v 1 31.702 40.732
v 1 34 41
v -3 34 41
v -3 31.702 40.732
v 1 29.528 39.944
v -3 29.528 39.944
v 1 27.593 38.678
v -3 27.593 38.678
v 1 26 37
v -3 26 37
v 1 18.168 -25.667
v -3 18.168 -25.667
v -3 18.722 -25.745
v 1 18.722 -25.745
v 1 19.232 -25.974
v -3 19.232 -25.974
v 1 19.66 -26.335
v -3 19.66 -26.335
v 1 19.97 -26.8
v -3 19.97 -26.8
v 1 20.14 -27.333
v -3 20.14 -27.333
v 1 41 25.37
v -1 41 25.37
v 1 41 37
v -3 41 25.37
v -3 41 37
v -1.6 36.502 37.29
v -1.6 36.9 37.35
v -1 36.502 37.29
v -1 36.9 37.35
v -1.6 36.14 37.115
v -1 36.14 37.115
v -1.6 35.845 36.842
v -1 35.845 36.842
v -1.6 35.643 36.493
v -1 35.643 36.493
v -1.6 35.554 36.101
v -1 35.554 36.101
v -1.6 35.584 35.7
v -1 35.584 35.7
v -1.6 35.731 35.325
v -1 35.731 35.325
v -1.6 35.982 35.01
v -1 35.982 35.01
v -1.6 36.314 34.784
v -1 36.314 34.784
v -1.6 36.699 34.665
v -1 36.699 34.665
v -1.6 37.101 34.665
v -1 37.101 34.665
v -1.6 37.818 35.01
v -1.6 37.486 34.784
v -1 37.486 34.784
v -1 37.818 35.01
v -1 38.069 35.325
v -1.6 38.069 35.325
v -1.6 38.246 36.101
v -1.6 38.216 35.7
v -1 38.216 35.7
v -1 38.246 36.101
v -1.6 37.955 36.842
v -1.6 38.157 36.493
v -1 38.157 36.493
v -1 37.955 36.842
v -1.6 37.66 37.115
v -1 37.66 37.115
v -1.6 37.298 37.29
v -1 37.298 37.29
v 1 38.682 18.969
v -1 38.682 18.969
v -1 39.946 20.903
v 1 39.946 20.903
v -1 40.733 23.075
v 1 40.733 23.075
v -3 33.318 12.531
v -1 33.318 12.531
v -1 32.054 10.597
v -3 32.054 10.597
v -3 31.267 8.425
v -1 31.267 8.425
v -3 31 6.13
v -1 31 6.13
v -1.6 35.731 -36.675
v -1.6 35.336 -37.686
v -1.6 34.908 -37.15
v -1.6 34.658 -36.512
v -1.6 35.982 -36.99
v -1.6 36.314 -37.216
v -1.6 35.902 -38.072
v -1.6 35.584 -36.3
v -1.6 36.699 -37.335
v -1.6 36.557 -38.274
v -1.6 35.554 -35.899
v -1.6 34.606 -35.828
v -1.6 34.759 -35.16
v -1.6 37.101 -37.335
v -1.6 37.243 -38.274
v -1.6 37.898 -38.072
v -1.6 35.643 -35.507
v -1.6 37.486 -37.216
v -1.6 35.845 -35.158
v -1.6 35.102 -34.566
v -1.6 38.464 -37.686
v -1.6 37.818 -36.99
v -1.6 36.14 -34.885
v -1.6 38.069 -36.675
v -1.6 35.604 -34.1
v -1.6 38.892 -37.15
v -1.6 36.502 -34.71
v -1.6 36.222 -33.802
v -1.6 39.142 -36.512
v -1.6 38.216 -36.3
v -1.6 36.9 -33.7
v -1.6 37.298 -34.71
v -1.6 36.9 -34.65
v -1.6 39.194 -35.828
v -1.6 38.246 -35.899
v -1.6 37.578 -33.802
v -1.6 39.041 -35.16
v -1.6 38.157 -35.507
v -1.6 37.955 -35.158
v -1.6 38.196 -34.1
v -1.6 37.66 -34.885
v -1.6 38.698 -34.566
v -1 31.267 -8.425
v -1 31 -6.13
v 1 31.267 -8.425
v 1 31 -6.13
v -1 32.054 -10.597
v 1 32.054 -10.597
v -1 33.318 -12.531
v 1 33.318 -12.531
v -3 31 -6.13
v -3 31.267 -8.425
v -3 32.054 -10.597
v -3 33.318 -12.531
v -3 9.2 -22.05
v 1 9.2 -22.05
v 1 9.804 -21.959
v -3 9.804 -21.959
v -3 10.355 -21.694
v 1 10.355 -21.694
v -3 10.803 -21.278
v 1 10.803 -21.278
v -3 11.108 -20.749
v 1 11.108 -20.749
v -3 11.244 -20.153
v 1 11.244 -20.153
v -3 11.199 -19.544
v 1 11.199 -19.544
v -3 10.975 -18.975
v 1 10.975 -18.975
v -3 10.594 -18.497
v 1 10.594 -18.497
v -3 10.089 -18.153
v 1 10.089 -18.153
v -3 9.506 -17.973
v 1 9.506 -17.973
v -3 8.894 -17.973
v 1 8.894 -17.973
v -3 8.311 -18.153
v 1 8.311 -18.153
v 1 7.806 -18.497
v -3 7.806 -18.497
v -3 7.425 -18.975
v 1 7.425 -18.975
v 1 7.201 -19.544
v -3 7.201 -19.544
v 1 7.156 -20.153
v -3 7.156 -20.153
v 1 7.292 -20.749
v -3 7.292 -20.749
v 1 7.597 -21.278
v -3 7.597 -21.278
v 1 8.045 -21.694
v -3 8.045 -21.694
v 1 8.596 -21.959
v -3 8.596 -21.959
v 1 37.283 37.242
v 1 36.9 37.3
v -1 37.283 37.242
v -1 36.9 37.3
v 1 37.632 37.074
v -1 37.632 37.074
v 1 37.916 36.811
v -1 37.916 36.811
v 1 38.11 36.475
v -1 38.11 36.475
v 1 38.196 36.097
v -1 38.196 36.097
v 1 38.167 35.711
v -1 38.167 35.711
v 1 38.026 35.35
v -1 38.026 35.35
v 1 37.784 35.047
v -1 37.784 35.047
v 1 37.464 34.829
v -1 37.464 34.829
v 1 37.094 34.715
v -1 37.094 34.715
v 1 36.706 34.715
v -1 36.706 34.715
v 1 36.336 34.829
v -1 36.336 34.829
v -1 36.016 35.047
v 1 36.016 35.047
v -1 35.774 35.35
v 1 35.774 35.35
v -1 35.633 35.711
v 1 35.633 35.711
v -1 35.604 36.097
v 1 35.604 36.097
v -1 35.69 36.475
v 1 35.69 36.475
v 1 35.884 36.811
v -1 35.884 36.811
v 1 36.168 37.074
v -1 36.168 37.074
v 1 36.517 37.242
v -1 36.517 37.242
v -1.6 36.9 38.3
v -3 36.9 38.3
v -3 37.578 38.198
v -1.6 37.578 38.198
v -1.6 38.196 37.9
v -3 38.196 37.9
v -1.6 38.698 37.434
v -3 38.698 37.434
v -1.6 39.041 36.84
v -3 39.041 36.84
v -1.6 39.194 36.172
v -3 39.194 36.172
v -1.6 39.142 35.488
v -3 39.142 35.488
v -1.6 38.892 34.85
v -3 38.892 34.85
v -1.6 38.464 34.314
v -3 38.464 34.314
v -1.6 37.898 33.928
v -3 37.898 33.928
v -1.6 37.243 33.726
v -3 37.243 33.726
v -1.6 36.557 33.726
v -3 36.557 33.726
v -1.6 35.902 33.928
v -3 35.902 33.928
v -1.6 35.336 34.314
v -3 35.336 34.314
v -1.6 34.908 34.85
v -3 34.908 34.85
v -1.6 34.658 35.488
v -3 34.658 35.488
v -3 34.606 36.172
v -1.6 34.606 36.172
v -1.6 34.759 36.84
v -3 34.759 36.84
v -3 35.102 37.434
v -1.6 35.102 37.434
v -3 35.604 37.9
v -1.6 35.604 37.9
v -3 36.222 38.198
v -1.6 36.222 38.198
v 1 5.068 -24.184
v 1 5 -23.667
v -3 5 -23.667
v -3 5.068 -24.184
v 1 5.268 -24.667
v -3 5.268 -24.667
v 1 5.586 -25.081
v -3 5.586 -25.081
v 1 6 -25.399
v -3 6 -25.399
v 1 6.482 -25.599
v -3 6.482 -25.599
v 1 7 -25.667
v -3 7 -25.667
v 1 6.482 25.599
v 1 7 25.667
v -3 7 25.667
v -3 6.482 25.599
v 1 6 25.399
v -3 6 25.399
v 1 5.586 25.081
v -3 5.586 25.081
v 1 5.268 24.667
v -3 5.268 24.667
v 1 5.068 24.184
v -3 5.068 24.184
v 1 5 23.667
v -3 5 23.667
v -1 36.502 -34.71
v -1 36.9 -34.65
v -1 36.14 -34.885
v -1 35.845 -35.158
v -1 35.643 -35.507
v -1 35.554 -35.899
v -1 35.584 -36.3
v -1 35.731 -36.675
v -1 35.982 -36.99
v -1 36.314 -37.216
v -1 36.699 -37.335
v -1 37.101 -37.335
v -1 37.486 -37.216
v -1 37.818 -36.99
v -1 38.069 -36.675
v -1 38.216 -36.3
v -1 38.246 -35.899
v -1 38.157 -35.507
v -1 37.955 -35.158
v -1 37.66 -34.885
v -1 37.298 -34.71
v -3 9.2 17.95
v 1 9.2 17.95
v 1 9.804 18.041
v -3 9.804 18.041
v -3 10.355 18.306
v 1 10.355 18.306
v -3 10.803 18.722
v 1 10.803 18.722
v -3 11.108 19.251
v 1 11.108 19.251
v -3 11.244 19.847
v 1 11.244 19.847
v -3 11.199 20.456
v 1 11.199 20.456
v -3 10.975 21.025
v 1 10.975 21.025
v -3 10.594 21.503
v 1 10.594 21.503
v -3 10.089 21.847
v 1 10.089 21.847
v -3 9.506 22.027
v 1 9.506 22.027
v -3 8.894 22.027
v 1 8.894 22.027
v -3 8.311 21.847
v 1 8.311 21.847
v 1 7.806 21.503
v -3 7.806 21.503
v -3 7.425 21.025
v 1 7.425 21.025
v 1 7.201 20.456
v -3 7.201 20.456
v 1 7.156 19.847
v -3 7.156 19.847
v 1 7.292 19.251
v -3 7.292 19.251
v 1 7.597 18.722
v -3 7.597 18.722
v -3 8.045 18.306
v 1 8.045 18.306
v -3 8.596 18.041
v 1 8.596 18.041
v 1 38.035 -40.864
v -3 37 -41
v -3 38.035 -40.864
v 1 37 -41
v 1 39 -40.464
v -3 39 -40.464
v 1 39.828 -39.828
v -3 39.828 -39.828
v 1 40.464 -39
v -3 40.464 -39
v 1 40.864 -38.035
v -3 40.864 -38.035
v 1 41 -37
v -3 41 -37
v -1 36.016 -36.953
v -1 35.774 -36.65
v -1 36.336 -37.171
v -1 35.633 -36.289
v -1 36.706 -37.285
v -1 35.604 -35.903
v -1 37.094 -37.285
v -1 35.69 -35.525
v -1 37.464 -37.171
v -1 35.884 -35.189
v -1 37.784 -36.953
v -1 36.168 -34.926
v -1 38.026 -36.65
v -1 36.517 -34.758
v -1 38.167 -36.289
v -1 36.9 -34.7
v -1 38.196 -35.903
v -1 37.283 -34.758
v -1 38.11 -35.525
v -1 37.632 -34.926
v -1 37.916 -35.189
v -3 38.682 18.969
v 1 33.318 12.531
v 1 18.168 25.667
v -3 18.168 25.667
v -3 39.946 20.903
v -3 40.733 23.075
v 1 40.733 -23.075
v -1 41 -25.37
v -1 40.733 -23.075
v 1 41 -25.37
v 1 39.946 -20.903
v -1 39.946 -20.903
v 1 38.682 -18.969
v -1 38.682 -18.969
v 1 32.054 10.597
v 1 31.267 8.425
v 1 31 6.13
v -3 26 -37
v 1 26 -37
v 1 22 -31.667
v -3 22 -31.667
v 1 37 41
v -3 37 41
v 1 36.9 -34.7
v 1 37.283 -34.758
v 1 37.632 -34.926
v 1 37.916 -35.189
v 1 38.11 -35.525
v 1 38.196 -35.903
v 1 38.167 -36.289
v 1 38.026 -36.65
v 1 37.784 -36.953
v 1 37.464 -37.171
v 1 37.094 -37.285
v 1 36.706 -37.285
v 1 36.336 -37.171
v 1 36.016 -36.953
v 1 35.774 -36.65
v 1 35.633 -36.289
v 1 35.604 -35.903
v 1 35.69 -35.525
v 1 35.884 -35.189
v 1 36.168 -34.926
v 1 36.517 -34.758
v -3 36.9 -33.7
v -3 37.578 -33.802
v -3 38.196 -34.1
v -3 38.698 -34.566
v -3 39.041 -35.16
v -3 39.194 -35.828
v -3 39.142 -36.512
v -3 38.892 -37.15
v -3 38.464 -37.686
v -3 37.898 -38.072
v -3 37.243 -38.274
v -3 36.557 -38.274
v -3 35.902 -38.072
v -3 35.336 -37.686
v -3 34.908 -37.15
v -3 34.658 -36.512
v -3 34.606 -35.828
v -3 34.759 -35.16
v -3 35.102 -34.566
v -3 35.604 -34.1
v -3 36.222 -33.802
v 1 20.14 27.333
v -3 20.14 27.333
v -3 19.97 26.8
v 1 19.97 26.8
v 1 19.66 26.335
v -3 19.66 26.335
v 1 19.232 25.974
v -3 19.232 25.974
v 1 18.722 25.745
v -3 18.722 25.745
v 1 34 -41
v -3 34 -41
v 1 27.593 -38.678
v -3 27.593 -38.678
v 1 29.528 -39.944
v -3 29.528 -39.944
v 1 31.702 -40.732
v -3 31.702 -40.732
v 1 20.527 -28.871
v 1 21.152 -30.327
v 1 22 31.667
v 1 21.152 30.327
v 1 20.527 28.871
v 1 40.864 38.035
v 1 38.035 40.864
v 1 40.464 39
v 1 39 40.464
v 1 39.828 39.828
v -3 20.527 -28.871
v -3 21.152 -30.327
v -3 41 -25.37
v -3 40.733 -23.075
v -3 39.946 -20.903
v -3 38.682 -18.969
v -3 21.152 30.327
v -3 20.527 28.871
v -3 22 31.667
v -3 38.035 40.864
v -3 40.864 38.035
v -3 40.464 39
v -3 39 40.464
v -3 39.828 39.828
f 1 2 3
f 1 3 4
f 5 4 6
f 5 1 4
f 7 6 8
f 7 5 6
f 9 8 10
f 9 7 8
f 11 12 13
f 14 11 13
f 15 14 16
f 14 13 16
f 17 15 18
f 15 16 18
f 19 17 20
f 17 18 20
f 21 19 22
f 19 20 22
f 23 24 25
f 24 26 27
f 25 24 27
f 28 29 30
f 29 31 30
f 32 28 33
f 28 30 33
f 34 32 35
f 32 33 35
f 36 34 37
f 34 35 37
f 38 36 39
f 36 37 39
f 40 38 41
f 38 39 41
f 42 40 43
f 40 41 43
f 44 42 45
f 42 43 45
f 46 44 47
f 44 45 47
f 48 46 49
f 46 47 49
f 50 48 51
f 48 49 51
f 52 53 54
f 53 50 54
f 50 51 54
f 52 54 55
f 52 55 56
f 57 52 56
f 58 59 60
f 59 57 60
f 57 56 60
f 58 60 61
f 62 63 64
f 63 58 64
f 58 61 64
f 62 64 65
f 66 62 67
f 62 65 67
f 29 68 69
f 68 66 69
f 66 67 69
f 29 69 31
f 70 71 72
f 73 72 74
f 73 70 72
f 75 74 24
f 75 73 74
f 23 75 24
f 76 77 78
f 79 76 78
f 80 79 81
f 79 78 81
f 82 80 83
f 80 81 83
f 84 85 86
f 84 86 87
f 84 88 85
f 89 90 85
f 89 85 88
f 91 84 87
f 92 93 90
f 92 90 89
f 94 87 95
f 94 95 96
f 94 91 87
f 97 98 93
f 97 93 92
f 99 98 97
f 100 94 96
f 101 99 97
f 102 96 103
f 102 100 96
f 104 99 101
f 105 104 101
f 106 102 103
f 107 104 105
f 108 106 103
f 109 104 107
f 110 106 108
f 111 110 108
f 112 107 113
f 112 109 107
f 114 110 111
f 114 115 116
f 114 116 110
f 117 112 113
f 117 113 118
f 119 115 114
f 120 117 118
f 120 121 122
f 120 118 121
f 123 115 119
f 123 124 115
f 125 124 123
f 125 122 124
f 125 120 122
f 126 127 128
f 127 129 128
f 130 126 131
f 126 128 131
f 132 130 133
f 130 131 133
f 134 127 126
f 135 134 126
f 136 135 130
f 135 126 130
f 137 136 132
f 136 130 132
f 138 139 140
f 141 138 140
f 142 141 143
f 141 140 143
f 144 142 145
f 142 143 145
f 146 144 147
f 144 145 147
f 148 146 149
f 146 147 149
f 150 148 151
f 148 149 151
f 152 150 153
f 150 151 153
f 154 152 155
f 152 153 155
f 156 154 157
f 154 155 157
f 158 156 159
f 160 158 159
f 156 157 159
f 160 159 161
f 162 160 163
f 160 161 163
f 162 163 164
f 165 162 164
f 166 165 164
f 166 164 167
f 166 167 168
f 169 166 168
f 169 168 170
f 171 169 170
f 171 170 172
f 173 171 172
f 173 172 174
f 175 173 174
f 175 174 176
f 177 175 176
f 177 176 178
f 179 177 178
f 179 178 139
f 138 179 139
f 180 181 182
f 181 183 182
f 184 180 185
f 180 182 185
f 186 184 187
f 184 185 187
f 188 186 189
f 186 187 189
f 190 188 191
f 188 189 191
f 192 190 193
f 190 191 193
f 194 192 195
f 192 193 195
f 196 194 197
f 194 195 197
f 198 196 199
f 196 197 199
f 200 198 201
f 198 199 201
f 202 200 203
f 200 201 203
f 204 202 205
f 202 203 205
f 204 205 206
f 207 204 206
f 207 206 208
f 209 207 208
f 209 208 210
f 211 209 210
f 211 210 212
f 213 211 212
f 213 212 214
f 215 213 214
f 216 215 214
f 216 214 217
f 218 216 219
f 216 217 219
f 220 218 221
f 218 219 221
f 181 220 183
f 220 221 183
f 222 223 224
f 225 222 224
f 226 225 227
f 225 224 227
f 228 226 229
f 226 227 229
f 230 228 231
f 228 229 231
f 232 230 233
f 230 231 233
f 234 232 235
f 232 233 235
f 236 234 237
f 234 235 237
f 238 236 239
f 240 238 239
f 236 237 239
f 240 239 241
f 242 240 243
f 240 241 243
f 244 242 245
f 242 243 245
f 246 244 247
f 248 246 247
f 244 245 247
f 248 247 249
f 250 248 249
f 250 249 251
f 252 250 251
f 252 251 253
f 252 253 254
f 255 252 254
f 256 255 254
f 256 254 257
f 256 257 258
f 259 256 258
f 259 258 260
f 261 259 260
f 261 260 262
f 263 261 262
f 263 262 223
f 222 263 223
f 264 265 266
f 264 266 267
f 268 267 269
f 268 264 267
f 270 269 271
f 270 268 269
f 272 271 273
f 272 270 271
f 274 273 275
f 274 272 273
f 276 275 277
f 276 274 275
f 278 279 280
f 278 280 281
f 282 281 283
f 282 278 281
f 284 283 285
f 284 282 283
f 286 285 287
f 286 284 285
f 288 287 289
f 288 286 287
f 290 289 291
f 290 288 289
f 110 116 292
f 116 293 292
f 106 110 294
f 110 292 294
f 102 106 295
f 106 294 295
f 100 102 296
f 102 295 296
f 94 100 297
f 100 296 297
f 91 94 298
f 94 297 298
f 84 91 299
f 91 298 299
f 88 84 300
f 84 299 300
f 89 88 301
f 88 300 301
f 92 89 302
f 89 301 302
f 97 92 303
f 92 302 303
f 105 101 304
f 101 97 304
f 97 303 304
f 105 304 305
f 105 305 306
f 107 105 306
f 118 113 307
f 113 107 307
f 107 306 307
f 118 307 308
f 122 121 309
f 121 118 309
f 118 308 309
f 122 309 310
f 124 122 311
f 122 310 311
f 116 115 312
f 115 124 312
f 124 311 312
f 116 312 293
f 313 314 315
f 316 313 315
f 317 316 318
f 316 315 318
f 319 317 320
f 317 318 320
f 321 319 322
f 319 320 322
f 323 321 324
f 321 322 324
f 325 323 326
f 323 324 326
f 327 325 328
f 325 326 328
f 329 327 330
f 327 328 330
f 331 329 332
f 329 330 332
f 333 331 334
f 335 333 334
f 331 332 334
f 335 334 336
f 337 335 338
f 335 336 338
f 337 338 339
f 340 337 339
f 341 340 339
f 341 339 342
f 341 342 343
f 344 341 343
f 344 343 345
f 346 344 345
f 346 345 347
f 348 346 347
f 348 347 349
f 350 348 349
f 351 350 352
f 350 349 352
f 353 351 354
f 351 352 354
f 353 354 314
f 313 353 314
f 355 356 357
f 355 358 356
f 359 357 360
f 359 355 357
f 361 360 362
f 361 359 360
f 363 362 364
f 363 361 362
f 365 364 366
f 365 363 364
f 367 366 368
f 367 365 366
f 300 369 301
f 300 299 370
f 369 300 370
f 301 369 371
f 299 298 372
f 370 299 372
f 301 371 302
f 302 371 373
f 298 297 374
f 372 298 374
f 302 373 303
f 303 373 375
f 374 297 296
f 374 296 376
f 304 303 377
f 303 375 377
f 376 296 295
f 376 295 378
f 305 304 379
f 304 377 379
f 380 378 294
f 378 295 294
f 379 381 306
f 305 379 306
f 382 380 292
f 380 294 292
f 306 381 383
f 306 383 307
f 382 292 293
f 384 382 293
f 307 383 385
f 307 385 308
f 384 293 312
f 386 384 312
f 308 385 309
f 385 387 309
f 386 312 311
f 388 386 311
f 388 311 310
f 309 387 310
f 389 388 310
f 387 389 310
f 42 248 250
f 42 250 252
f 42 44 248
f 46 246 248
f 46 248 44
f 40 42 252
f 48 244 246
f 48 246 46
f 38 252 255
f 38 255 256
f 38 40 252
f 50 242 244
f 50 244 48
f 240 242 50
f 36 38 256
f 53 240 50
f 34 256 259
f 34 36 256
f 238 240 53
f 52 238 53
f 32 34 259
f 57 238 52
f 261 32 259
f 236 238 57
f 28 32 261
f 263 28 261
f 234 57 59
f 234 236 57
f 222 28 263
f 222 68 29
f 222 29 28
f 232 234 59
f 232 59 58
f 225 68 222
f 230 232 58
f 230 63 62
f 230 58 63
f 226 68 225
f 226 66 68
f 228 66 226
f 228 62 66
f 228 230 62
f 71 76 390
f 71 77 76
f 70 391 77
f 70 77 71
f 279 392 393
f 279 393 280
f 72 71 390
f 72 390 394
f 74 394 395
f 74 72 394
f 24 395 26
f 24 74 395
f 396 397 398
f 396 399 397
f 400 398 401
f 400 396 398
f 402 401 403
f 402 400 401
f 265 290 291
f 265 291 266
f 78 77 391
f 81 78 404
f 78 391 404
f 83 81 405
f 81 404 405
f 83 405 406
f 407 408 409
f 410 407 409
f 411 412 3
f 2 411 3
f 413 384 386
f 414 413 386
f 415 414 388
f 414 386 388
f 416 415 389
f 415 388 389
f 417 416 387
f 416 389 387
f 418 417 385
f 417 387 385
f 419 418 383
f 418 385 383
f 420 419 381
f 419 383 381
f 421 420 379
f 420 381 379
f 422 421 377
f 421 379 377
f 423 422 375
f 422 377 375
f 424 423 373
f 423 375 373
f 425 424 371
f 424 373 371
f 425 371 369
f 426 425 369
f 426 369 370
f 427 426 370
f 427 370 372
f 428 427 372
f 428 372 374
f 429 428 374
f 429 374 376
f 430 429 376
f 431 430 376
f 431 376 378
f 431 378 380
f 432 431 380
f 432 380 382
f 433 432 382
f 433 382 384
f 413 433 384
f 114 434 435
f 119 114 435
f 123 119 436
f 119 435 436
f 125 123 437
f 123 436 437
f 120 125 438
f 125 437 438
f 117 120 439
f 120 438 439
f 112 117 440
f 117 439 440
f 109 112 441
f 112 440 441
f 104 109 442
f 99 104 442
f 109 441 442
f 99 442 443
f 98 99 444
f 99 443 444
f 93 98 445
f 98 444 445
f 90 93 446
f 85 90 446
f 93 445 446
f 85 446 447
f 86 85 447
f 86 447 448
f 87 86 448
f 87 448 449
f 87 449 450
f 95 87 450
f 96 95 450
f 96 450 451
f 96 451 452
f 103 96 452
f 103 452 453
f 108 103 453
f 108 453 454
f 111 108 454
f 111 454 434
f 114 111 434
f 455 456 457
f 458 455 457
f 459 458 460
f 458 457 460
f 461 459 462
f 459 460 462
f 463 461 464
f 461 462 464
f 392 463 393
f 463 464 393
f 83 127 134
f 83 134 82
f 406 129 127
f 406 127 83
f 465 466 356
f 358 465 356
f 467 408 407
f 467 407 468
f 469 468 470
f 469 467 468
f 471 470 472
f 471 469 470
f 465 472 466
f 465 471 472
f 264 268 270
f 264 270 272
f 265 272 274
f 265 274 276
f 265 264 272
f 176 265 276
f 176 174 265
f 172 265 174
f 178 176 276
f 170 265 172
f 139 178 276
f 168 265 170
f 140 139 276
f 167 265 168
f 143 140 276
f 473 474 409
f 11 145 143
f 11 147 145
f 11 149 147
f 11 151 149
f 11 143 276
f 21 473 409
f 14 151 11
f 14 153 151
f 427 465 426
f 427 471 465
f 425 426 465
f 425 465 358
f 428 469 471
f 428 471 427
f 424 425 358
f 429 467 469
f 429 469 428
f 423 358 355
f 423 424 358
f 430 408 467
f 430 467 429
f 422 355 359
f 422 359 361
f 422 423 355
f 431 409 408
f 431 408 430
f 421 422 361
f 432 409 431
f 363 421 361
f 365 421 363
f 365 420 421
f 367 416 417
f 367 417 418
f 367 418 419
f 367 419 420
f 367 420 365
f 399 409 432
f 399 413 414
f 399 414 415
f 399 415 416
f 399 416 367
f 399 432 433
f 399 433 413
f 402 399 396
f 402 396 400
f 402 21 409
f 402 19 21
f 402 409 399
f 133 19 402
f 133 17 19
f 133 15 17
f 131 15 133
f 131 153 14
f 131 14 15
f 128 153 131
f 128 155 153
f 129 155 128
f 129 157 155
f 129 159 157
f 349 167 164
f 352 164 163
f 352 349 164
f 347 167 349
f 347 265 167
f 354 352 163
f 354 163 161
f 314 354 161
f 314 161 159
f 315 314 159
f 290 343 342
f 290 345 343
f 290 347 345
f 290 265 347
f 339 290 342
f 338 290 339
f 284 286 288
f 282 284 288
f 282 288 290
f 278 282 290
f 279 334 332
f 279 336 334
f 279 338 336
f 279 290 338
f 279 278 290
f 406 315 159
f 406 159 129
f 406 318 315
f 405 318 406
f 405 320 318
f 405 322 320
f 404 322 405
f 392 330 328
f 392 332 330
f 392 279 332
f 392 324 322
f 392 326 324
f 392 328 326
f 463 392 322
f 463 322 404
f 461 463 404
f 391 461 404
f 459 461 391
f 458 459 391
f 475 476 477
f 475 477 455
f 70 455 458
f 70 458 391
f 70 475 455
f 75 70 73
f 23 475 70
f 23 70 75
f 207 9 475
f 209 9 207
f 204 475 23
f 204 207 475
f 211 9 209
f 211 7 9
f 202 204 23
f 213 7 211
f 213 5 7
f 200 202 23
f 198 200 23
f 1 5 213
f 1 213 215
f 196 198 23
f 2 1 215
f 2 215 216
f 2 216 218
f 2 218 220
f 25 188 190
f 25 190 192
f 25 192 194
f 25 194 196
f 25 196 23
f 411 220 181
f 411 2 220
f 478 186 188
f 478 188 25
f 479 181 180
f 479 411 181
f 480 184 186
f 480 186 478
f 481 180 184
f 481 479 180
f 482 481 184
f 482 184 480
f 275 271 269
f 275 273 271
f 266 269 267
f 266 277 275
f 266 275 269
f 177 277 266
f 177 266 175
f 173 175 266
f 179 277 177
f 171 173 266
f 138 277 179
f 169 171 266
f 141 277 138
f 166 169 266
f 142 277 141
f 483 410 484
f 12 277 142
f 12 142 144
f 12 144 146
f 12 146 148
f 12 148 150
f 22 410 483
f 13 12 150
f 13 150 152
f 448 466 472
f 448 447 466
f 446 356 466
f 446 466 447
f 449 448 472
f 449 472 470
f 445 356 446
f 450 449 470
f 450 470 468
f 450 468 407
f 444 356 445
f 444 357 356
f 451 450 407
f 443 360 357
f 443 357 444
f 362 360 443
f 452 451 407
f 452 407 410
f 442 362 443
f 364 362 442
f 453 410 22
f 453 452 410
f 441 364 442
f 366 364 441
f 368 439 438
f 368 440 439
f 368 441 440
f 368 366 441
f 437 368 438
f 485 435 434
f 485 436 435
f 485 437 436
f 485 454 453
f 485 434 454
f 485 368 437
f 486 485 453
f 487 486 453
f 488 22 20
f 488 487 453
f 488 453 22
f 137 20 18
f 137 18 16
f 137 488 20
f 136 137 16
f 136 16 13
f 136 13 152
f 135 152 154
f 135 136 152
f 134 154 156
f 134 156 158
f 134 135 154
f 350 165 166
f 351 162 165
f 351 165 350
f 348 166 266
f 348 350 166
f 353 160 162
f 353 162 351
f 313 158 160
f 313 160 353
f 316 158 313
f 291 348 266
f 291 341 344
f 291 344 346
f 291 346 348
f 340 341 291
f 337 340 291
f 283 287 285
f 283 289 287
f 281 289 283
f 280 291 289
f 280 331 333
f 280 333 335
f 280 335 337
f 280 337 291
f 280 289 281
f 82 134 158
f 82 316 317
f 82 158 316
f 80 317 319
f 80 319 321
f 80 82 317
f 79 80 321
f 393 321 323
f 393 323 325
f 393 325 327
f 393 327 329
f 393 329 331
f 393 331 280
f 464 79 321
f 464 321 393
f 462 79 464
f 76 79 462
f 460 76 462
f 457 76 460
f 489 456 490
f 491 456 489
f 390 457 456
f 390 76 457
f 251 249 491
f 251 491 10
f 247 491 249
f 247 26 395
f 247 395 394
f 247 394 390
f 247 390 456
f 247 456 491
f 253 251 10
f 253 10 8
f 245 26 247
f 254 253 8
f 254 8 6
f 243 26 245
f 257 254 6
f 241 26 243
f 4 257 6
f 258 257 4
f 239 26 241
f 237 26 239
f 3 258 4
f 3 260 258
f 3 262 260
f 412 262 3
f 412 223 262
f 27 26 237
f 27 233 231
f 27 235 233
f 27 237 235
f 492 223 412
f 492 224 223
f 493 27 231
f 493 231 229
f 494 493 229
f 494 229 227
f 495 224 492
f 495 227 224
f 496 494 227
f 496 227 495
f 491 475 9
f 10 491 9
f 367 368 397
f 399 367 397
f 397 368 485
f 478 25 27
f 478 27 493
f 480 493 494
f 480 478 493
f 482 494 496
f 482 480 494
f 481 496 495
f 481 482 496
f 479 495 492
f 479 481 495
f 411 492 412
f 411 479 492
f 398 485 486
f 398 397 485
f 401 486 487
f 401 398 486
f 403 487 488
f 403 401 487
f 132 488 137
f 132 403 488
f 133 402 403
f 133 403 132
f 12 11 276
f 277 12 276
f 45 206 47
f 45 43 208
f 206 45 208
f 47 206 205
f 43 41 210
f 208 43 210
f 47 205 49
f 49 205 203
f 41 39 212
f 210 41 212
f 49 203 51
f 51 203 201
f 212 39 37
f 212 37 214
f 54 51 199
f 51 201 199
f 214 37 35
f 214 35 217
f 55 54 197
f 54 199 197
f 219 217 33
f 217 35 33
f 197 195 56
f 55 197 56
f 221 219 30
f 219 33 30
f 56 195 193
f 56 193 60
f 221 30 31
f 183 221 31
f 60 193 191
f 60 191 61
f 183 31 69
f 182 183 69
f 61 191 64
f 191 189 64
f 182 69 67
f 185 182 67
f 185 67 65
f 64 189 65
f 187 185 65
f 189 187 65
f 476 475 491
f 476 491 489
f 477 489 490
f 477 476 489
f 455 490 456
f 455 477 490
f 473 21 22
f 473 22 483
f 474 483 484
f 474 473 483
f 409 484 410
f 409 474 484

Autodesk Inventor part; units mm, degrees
ref_plane "YZ Plane" through (0, 0, 0) normal (1, 0, 0) x (0, 1, 0)
ref_plane "XZ Plane" through (0, 0, 0) normal (0, 1, 0) x (-1, 0, 0)
ref_plane "XY Plane" through (0, 0, 0) normal (0, 0, 1) x (1, 0, 0)
sketch "Sketch1" plane through (0, 0, 0) normal (1, 0, 0) x (0, 1, 0)
  line L0 (41, 41) -> (-41, 41)
  line L1 (-41, 41) -> (-41, -41)
  line L2 (-41, -41) -> (41, -41)
  line L3 (41, -41) -> (41, 41)
  point P0 (0, 0)
  point P1 (0, 41)
  point P2 (41, 0)
  dimension "d0" = 82
  dimension "d1" = 82
extrude "Extrusion1" add sketch "Sketch1" along normal mid plane 2
sketch "Sketch2" plane through (-1, 0, 0) normal (-1, 0, 0) x (0, 0, 1)
  line L0 (31.6667, 22) -> (37, 26) projected
  arc A0 (25.6667, 20) -> (31.6667, 22) centre (25.6667, 30) ccw projected
  line L1 (17.5, 20) -> (25.6667, 20) projected
  line L2 (17.5, 20) -> (17.5, 18.2355) projected
  line L3 (-17.5, 18.2356) -> (17.5, 18.2356) projected
  line L4 (-17.5, 20) -> (-17.5, 18.2355) projected
  line L5 (-25.6667, 20) -> (-17.5, 20) projected
  arc A1 (-31.6667, 22) -> (-25.6667, 20) centre (-25.6667, 30) ccw projected
  line L6 (-37, 26) -> (-31.6667, 22) projected
  arc A2 (-41, 34) -> (-37, 26) centre (-31, 34) ccw projected
  line L7 (-41, 37) -> (-41, 34) projected
  arc A3 (-37, 41) -> (-41, 37) centre (-37, 37) ccw projected
  line L8 (-37, 41) -> (-25.3705, 41) projected
  arc A4 (-18.9687, 38.6822) -> (-25.3705, 41) centre (-25.3705, 31) ccw projected
  line L9 (-18.9687, 38.6822) -> (-12.5313, 33.3178) projected
  arc A5 (-12.5313, 33.3178) -> (-6.1295, 31) centre (-6.1295, 41) ccw projected
  line L10 (-6.1295, 31) -> (6.1295, 31) projected
  arc A6 (6.1295, 31) -> (12.5313, 33.3178) centre (6.1295, 41) ccw projected
  line L11 (12.5313, 33.3178) -> (18.9687, 38.6822) projected
  arc A7 (25.3705, 41) -> (18.9687, 38.6822) centre (25.3705, 31) ccw projected
  line L12 (25.3705, 41) -> (37, 41) projected
  arc A8 (41, 37) -> (37, 41) centre (37, 37) ccw projected
  line L13 (41, 37) -> (41, 34) projected
  arc A9 (37, 26) -> (41, 34) centre (31, 34) ccw projected
  circle A10 centre (36, 36.9) radius 1.35 projected
  circle A11 centre (-36, 36.9) radius 1.35 projected
  line L14 (-25.6667, 20) -> (-25.6667, 5)
  line L15 (25.6667, 20) -> (25.6667, 5)
  line L16 (25.6667, 5) -> (-25.6667, 5)
  point P0 (0, 0)
  dimension "d4" = 15
extrude "Extrusion2" add sketch "Sketch2" along normal blind 2
sketch "Sketch3" plane through (1, 0, 0) normal (1, 0, 0) x (0, 0, -1)
  line L0 (-31.6667, 22) -> (-37, 26) projected
  arc A0 (-41, 34) -> (-37, 26) centre (-31, 34) ccw projected
  line L1 (-41, 34) -> (-41, 37) projected
  arc A1 (-37, 41) -> (-41, 37) centre (-37, 37) ccw projected
  line L2 (-37, 41) -> (-25.3705, 41) projected
  arc A2 (-18.9687, 38.6822) -> (-25.3705, 41) centre (-25.3705, 31) ccw projected
  line L3 (-18.9687, 38.6822) -> (-12.5313, 33.3178) projected
  arc A3 (-12.5313, 33.3178) -> (-6.1295, 31) centre (-6.1295, 41) ccw projected
  line L4 (-6.1295, 31) -> (6.1295, 31) projected
  arc A4 (6.1295, 31) -> (12.5313, 33.3178) centre (6.1295, 41) ccw projected
  line L5 (12.5313, 33.3178) -> (18.9687, 38.6822) projected
  arc A5 (25.3705, 41) -> (18.9687, 38.6822) centre (25.3705, 31) ccw projected
  line L6 (25.3705, 41) -> (37, 41) projected
  arc A6 (41, 37) -> (37, 41) centre (37, 37) ccw projected
  line L7 (41, 37) -> (41, 34) projected
  arc A7 (37, 26) -> (41, 34) centre (31, 34) ccw projected
  line L8 (37, 26) -> (31.6667, 22) projected
  arc A8 (25.6667, 20) -> (31.6667, 22) centre (25.6667, 30) ccw projected
  line L9 (25.6667, 20) -> (25.6667, 5) projected
  line L10 (25.6667, 5) -> (-25.6667, 5) projected
  line L11 (-25.6667, 5) -> (-25.6667, 20) projected
  arc A9 (-31.6667, 22) -> (-25.6667, 20) centre (-25.6667, 30) ccw projected
  circle A10 centre (-36, 36.9) radius 1.35 projected
  circle A11 centre (36, 36.9) radius 1.35 projected
  line L12 (-41, -41) -> (41, -41) projected
  line L13 (41, -41) -> (41, 41) projected
  line L14 (41, 41) -> (-41, 41) projected
  line L15 (-41, 41) -> (-41, -41) projected
  point P0 (0, 0)
  point P1 (41, 37)
  point P2 (-37, 41)
  point P3 (25.3705, 41)
  point P4 (-41, 34)
extrude "Extrusion3" cut sketch "Sketch3" against normal blind 15 contours A9 L11 L10 L9 A8 L8 A7 L13 L12 L15 A0 L0 | L15 L14 A1 | L14 A5 L5 A4 L4 A3 L3 A2 | A6 L14 L13
sketch "Sketch4" plane through (-3, 0, 0) normal (-1, 0, 0) x (0, 0, 1)
  line L0 (31.6667, 22) -> (37, 26) projected
  arc A0 (37, 26) -> (41, 34) centre (31, 34) ccw projected
  line L1 (41, 34) -> (41, 37) projected
  arc A1 (41, 37) -> (37, 41) centre (37, 37) ccw projected
  line L2 (37, 41) -> (25.3705, 41) projected
  arc A2 (25.3705, 41) -> (18.9687, 38.6822) centre (25.3705, 31) ccw projected
  line L3 (18.9687, 38.6822) -> (12.5313, 33.3178) projected
  arc A3 (6.1295, 31) -> (12.5313, 33.3178) centre (6.1295, 41) ccw projected
  line L4 (6.1295, 31) -> (-6.1295, 31) projected
  arc A4 (-12.5313, 33.3178) -> (-6.1295, 31) centre (-6.1295, 41) ccw projected
  line L5 (-12.5313, 33.3178) -> (-18.9687, 38.6822) projected
  arc A5 (-18.9687, 38.6822) -> (-25.3705, 41) centre (-25.3705, 31) ccw projected
  line L6 (-25.3705, 41) -> (-37, 41) projected
  arc A6 (-37, 41) -> (-41, 37) centre (-37, 37) ccw projected
  line L7 (-41, 37) -> (-41, 34) projected
  arc A7 (-41, 34) -> (-37, 26) centre (-31, 34) ccw projected
  line L8 (-37, 26) -> (-31.6667, 22) projected
  arc A8 (-31.6667, 22) -> (-25.6667, 20) centre (-25.6667, 30) ccw projected
  line L9 (-25.6667, 20) -> (-25.6667, 5) projected
  line L10 (-25.6667, 5) -> (25.6667, 5) projected
  line L11 (25.6667, 5) -> (25.6667, 20) projected
  arc A9 (25.6667, 20) -> (31.6667, 22) centre (25.6667, 30) ccw projected
  circle A10 centre (36, 36.9) radius 1.35 projected
  circle A11 centre (-36, 36.9) radius 1.35 projected
  circle A12 centre (-36, 36.9) radius 2.3
  circle A13 centre (36, 36.9) radius 2.3
  point P0 (0, 0)
  dimension "d9" = 4.6
  dimension "d10" = 4.6
extrude "Extrusion4" cut sketch "Sketch4" against normal blind 1.4 contours A12 | A13
sketch "Sketch5" plane through (-3, 0, 0) normal (-1, 0, 0) x (0, 0, 1)
  circle A0 centre (36, 36.9) radius 2.3 projected
  circle A1 centre (-36, 36.9) radius 2.3 projected
  line L0 (31.6667, 22) -> (37, 26) projected
  arc A2 (37, 26) -> (41, 34) centre (31, 34) ccw projected
  line L1 (41, 34) -> (41, 37) projected
  arc A3 (41, 37) -> (37, 41) centre (37, 37) ccw projected
  line L2 (37, 41) -> (25.3705, 41) projected
  arc A4 (25.3705, 41) -> (18.9687, 38.6822) centre (25.3705, 31) ccw projected
  line L3 (18.9687, 38.6822) -> (12.5313, 33.3178) projected
  arc A5 (6.1295, 31) -> (12.5313, 33.3178) centre (6.1295, 41) ccw projected
  line L4 (6.1295, 31) -> (-6.1295, 31) projected
  arc A6 (-12.5313, 33.3178) -> (-6.1295, 31) centre (-6.1295, 41) ccw projected
  line L5 (-12.5313, 33.3178) -> (-18.9687, 38.6822) projected
  arc A7 (-18.9687, 38.6822) -> (-25.3705, 41) centre (-25.3705, 31) ccw projected
  line L6 (-25.3705, 41) -> (-37, 41) projected
  arc A8 (-37, 41) -> (-41, 37) centre (-37, 37) ccw projected
  line L7 (-41, 37) -> (-41, 34) projected
  arc A9 (-41, 34) -> (-37, 26) centre (-31, 34) ccw projected
  line L8 (-37, 26) -> (-31.6667, 22) projected
  arc A10 (-31.6667, 22) -> (-25.6667, 20) centre (-25.6667, 30) ccw projected
  line L9 (-25.6667, 20) -> (-25.6667, 5) projected
  line L10 (-25.6667, 5) -> (25.6667, 5) projected
  line L11 (25.6667, 5) -> (25.6667, 20) projected
  arc A11 (25.6667, 20) -> (31.6667, 22) centre (25.6667, 30) ccw projected
  circle A12 centre (-36, 36.9) radius 1.3
  circle A13 centre (36, 36.9) radius 1.3
  point P0 (0, 0)
  dimension "d13" = 2.6
  dimension "d14" = 2.6
extrude "Extrusion5" cut sketch "Sketch5" against normal through all contours A12 | A13
sketch "Sketch6" plane through (1, 0, 0) normal (1, 0, 0) x (0, 0, -1)
  arc A0 (-37, 41) -> (-41, 37) centre (-37, 37) ccw projected
  line L0 (-41, 37) -> (-41, 34) projected
  arc A1 (-41, 34) -> (-37, 26) centre (-31, 34) ccw projected
  line L1 (-37, 26) -> (-31.6667, 22) projected
  arc A2 (-31.6667, 22) -> (-25.6667, 20) centre (-25.6667, 30) ccw projected
  line L2 (-25.6667, 20) -> (-25.6667, 5) projected
  line L3 (-25.6667, 5) -> (25.6667, 5) projected
  line L4 (25.6667, 5) -> (25.6667, 20) projected
  arc A3 (25.6667, 20) -> (31.6667, 22) centre (25.6667, 30) ccw projected
  line L5 (31.6667, 22) -> (37, 26) projected
  arc A4 (37, 26) -> (41, 34) centre (31, 34) ccw projected
  line L6 (41, 34) -> (41, 37) projected
  arc A5 (41, 37) -> (37, 41) centre (37, 37) ccw projected
  line L7 (37, 41) -> (25.3705, 41) projected
  arc A6 (25.3705, 41) -> (18.9687, 38.6822) centre (25.3705, 31) ccw projected
  line L8 (18.9687, 38.6822) -> (12.5313, 33.3178) projected
  arc A7 (6.1295, 31) -> (12.5313, 33.3178) centre (6.1295, 41) ccw projected
  line L9 (6.1295, 31) -> (-6.1295, 31) projected
  arc A8 (-12.5313, 33.3178) -> (-6.1295, 31) centre (-6.1295, 41) ccw projected
  line L10 (-12.5313, 33.3178) -> (-18.9687, 38.6822) projected
  arc A9 (-18.9687, 38.6822) -> (-25.3705, 41) centre (-25.3705, 31) ccw projected
  line L11 (-25.3705, 41) -> (-37, 41) projected
  circle A10 centre (-20, 9.2) radius 2.05
  circle A11 centre (20, 9.2) radius 2.05
  line L12 (-20, 9.2) -> (20, 9.2) construction
  point P0 (0, 0)
  point P1 (0, 31)
  point P2 (0, 9.2)
  dimension "d17" = 4.1
  dimension "d18" = 4.1
  dimension "d19" = 4.2
  dimension "d20" = 40
extrude "Extrusion6" cut sketch "Sketch6" against normal blind 10 contours A10 | A11
fillet "Fillet1" radius 2 4 edges at (-1, 20, -25.6667) (-1, 5, -25.6667) (-1, 5, 25.6667) (-1, 20, 25.6667)
properties part number "Camera_mount"
